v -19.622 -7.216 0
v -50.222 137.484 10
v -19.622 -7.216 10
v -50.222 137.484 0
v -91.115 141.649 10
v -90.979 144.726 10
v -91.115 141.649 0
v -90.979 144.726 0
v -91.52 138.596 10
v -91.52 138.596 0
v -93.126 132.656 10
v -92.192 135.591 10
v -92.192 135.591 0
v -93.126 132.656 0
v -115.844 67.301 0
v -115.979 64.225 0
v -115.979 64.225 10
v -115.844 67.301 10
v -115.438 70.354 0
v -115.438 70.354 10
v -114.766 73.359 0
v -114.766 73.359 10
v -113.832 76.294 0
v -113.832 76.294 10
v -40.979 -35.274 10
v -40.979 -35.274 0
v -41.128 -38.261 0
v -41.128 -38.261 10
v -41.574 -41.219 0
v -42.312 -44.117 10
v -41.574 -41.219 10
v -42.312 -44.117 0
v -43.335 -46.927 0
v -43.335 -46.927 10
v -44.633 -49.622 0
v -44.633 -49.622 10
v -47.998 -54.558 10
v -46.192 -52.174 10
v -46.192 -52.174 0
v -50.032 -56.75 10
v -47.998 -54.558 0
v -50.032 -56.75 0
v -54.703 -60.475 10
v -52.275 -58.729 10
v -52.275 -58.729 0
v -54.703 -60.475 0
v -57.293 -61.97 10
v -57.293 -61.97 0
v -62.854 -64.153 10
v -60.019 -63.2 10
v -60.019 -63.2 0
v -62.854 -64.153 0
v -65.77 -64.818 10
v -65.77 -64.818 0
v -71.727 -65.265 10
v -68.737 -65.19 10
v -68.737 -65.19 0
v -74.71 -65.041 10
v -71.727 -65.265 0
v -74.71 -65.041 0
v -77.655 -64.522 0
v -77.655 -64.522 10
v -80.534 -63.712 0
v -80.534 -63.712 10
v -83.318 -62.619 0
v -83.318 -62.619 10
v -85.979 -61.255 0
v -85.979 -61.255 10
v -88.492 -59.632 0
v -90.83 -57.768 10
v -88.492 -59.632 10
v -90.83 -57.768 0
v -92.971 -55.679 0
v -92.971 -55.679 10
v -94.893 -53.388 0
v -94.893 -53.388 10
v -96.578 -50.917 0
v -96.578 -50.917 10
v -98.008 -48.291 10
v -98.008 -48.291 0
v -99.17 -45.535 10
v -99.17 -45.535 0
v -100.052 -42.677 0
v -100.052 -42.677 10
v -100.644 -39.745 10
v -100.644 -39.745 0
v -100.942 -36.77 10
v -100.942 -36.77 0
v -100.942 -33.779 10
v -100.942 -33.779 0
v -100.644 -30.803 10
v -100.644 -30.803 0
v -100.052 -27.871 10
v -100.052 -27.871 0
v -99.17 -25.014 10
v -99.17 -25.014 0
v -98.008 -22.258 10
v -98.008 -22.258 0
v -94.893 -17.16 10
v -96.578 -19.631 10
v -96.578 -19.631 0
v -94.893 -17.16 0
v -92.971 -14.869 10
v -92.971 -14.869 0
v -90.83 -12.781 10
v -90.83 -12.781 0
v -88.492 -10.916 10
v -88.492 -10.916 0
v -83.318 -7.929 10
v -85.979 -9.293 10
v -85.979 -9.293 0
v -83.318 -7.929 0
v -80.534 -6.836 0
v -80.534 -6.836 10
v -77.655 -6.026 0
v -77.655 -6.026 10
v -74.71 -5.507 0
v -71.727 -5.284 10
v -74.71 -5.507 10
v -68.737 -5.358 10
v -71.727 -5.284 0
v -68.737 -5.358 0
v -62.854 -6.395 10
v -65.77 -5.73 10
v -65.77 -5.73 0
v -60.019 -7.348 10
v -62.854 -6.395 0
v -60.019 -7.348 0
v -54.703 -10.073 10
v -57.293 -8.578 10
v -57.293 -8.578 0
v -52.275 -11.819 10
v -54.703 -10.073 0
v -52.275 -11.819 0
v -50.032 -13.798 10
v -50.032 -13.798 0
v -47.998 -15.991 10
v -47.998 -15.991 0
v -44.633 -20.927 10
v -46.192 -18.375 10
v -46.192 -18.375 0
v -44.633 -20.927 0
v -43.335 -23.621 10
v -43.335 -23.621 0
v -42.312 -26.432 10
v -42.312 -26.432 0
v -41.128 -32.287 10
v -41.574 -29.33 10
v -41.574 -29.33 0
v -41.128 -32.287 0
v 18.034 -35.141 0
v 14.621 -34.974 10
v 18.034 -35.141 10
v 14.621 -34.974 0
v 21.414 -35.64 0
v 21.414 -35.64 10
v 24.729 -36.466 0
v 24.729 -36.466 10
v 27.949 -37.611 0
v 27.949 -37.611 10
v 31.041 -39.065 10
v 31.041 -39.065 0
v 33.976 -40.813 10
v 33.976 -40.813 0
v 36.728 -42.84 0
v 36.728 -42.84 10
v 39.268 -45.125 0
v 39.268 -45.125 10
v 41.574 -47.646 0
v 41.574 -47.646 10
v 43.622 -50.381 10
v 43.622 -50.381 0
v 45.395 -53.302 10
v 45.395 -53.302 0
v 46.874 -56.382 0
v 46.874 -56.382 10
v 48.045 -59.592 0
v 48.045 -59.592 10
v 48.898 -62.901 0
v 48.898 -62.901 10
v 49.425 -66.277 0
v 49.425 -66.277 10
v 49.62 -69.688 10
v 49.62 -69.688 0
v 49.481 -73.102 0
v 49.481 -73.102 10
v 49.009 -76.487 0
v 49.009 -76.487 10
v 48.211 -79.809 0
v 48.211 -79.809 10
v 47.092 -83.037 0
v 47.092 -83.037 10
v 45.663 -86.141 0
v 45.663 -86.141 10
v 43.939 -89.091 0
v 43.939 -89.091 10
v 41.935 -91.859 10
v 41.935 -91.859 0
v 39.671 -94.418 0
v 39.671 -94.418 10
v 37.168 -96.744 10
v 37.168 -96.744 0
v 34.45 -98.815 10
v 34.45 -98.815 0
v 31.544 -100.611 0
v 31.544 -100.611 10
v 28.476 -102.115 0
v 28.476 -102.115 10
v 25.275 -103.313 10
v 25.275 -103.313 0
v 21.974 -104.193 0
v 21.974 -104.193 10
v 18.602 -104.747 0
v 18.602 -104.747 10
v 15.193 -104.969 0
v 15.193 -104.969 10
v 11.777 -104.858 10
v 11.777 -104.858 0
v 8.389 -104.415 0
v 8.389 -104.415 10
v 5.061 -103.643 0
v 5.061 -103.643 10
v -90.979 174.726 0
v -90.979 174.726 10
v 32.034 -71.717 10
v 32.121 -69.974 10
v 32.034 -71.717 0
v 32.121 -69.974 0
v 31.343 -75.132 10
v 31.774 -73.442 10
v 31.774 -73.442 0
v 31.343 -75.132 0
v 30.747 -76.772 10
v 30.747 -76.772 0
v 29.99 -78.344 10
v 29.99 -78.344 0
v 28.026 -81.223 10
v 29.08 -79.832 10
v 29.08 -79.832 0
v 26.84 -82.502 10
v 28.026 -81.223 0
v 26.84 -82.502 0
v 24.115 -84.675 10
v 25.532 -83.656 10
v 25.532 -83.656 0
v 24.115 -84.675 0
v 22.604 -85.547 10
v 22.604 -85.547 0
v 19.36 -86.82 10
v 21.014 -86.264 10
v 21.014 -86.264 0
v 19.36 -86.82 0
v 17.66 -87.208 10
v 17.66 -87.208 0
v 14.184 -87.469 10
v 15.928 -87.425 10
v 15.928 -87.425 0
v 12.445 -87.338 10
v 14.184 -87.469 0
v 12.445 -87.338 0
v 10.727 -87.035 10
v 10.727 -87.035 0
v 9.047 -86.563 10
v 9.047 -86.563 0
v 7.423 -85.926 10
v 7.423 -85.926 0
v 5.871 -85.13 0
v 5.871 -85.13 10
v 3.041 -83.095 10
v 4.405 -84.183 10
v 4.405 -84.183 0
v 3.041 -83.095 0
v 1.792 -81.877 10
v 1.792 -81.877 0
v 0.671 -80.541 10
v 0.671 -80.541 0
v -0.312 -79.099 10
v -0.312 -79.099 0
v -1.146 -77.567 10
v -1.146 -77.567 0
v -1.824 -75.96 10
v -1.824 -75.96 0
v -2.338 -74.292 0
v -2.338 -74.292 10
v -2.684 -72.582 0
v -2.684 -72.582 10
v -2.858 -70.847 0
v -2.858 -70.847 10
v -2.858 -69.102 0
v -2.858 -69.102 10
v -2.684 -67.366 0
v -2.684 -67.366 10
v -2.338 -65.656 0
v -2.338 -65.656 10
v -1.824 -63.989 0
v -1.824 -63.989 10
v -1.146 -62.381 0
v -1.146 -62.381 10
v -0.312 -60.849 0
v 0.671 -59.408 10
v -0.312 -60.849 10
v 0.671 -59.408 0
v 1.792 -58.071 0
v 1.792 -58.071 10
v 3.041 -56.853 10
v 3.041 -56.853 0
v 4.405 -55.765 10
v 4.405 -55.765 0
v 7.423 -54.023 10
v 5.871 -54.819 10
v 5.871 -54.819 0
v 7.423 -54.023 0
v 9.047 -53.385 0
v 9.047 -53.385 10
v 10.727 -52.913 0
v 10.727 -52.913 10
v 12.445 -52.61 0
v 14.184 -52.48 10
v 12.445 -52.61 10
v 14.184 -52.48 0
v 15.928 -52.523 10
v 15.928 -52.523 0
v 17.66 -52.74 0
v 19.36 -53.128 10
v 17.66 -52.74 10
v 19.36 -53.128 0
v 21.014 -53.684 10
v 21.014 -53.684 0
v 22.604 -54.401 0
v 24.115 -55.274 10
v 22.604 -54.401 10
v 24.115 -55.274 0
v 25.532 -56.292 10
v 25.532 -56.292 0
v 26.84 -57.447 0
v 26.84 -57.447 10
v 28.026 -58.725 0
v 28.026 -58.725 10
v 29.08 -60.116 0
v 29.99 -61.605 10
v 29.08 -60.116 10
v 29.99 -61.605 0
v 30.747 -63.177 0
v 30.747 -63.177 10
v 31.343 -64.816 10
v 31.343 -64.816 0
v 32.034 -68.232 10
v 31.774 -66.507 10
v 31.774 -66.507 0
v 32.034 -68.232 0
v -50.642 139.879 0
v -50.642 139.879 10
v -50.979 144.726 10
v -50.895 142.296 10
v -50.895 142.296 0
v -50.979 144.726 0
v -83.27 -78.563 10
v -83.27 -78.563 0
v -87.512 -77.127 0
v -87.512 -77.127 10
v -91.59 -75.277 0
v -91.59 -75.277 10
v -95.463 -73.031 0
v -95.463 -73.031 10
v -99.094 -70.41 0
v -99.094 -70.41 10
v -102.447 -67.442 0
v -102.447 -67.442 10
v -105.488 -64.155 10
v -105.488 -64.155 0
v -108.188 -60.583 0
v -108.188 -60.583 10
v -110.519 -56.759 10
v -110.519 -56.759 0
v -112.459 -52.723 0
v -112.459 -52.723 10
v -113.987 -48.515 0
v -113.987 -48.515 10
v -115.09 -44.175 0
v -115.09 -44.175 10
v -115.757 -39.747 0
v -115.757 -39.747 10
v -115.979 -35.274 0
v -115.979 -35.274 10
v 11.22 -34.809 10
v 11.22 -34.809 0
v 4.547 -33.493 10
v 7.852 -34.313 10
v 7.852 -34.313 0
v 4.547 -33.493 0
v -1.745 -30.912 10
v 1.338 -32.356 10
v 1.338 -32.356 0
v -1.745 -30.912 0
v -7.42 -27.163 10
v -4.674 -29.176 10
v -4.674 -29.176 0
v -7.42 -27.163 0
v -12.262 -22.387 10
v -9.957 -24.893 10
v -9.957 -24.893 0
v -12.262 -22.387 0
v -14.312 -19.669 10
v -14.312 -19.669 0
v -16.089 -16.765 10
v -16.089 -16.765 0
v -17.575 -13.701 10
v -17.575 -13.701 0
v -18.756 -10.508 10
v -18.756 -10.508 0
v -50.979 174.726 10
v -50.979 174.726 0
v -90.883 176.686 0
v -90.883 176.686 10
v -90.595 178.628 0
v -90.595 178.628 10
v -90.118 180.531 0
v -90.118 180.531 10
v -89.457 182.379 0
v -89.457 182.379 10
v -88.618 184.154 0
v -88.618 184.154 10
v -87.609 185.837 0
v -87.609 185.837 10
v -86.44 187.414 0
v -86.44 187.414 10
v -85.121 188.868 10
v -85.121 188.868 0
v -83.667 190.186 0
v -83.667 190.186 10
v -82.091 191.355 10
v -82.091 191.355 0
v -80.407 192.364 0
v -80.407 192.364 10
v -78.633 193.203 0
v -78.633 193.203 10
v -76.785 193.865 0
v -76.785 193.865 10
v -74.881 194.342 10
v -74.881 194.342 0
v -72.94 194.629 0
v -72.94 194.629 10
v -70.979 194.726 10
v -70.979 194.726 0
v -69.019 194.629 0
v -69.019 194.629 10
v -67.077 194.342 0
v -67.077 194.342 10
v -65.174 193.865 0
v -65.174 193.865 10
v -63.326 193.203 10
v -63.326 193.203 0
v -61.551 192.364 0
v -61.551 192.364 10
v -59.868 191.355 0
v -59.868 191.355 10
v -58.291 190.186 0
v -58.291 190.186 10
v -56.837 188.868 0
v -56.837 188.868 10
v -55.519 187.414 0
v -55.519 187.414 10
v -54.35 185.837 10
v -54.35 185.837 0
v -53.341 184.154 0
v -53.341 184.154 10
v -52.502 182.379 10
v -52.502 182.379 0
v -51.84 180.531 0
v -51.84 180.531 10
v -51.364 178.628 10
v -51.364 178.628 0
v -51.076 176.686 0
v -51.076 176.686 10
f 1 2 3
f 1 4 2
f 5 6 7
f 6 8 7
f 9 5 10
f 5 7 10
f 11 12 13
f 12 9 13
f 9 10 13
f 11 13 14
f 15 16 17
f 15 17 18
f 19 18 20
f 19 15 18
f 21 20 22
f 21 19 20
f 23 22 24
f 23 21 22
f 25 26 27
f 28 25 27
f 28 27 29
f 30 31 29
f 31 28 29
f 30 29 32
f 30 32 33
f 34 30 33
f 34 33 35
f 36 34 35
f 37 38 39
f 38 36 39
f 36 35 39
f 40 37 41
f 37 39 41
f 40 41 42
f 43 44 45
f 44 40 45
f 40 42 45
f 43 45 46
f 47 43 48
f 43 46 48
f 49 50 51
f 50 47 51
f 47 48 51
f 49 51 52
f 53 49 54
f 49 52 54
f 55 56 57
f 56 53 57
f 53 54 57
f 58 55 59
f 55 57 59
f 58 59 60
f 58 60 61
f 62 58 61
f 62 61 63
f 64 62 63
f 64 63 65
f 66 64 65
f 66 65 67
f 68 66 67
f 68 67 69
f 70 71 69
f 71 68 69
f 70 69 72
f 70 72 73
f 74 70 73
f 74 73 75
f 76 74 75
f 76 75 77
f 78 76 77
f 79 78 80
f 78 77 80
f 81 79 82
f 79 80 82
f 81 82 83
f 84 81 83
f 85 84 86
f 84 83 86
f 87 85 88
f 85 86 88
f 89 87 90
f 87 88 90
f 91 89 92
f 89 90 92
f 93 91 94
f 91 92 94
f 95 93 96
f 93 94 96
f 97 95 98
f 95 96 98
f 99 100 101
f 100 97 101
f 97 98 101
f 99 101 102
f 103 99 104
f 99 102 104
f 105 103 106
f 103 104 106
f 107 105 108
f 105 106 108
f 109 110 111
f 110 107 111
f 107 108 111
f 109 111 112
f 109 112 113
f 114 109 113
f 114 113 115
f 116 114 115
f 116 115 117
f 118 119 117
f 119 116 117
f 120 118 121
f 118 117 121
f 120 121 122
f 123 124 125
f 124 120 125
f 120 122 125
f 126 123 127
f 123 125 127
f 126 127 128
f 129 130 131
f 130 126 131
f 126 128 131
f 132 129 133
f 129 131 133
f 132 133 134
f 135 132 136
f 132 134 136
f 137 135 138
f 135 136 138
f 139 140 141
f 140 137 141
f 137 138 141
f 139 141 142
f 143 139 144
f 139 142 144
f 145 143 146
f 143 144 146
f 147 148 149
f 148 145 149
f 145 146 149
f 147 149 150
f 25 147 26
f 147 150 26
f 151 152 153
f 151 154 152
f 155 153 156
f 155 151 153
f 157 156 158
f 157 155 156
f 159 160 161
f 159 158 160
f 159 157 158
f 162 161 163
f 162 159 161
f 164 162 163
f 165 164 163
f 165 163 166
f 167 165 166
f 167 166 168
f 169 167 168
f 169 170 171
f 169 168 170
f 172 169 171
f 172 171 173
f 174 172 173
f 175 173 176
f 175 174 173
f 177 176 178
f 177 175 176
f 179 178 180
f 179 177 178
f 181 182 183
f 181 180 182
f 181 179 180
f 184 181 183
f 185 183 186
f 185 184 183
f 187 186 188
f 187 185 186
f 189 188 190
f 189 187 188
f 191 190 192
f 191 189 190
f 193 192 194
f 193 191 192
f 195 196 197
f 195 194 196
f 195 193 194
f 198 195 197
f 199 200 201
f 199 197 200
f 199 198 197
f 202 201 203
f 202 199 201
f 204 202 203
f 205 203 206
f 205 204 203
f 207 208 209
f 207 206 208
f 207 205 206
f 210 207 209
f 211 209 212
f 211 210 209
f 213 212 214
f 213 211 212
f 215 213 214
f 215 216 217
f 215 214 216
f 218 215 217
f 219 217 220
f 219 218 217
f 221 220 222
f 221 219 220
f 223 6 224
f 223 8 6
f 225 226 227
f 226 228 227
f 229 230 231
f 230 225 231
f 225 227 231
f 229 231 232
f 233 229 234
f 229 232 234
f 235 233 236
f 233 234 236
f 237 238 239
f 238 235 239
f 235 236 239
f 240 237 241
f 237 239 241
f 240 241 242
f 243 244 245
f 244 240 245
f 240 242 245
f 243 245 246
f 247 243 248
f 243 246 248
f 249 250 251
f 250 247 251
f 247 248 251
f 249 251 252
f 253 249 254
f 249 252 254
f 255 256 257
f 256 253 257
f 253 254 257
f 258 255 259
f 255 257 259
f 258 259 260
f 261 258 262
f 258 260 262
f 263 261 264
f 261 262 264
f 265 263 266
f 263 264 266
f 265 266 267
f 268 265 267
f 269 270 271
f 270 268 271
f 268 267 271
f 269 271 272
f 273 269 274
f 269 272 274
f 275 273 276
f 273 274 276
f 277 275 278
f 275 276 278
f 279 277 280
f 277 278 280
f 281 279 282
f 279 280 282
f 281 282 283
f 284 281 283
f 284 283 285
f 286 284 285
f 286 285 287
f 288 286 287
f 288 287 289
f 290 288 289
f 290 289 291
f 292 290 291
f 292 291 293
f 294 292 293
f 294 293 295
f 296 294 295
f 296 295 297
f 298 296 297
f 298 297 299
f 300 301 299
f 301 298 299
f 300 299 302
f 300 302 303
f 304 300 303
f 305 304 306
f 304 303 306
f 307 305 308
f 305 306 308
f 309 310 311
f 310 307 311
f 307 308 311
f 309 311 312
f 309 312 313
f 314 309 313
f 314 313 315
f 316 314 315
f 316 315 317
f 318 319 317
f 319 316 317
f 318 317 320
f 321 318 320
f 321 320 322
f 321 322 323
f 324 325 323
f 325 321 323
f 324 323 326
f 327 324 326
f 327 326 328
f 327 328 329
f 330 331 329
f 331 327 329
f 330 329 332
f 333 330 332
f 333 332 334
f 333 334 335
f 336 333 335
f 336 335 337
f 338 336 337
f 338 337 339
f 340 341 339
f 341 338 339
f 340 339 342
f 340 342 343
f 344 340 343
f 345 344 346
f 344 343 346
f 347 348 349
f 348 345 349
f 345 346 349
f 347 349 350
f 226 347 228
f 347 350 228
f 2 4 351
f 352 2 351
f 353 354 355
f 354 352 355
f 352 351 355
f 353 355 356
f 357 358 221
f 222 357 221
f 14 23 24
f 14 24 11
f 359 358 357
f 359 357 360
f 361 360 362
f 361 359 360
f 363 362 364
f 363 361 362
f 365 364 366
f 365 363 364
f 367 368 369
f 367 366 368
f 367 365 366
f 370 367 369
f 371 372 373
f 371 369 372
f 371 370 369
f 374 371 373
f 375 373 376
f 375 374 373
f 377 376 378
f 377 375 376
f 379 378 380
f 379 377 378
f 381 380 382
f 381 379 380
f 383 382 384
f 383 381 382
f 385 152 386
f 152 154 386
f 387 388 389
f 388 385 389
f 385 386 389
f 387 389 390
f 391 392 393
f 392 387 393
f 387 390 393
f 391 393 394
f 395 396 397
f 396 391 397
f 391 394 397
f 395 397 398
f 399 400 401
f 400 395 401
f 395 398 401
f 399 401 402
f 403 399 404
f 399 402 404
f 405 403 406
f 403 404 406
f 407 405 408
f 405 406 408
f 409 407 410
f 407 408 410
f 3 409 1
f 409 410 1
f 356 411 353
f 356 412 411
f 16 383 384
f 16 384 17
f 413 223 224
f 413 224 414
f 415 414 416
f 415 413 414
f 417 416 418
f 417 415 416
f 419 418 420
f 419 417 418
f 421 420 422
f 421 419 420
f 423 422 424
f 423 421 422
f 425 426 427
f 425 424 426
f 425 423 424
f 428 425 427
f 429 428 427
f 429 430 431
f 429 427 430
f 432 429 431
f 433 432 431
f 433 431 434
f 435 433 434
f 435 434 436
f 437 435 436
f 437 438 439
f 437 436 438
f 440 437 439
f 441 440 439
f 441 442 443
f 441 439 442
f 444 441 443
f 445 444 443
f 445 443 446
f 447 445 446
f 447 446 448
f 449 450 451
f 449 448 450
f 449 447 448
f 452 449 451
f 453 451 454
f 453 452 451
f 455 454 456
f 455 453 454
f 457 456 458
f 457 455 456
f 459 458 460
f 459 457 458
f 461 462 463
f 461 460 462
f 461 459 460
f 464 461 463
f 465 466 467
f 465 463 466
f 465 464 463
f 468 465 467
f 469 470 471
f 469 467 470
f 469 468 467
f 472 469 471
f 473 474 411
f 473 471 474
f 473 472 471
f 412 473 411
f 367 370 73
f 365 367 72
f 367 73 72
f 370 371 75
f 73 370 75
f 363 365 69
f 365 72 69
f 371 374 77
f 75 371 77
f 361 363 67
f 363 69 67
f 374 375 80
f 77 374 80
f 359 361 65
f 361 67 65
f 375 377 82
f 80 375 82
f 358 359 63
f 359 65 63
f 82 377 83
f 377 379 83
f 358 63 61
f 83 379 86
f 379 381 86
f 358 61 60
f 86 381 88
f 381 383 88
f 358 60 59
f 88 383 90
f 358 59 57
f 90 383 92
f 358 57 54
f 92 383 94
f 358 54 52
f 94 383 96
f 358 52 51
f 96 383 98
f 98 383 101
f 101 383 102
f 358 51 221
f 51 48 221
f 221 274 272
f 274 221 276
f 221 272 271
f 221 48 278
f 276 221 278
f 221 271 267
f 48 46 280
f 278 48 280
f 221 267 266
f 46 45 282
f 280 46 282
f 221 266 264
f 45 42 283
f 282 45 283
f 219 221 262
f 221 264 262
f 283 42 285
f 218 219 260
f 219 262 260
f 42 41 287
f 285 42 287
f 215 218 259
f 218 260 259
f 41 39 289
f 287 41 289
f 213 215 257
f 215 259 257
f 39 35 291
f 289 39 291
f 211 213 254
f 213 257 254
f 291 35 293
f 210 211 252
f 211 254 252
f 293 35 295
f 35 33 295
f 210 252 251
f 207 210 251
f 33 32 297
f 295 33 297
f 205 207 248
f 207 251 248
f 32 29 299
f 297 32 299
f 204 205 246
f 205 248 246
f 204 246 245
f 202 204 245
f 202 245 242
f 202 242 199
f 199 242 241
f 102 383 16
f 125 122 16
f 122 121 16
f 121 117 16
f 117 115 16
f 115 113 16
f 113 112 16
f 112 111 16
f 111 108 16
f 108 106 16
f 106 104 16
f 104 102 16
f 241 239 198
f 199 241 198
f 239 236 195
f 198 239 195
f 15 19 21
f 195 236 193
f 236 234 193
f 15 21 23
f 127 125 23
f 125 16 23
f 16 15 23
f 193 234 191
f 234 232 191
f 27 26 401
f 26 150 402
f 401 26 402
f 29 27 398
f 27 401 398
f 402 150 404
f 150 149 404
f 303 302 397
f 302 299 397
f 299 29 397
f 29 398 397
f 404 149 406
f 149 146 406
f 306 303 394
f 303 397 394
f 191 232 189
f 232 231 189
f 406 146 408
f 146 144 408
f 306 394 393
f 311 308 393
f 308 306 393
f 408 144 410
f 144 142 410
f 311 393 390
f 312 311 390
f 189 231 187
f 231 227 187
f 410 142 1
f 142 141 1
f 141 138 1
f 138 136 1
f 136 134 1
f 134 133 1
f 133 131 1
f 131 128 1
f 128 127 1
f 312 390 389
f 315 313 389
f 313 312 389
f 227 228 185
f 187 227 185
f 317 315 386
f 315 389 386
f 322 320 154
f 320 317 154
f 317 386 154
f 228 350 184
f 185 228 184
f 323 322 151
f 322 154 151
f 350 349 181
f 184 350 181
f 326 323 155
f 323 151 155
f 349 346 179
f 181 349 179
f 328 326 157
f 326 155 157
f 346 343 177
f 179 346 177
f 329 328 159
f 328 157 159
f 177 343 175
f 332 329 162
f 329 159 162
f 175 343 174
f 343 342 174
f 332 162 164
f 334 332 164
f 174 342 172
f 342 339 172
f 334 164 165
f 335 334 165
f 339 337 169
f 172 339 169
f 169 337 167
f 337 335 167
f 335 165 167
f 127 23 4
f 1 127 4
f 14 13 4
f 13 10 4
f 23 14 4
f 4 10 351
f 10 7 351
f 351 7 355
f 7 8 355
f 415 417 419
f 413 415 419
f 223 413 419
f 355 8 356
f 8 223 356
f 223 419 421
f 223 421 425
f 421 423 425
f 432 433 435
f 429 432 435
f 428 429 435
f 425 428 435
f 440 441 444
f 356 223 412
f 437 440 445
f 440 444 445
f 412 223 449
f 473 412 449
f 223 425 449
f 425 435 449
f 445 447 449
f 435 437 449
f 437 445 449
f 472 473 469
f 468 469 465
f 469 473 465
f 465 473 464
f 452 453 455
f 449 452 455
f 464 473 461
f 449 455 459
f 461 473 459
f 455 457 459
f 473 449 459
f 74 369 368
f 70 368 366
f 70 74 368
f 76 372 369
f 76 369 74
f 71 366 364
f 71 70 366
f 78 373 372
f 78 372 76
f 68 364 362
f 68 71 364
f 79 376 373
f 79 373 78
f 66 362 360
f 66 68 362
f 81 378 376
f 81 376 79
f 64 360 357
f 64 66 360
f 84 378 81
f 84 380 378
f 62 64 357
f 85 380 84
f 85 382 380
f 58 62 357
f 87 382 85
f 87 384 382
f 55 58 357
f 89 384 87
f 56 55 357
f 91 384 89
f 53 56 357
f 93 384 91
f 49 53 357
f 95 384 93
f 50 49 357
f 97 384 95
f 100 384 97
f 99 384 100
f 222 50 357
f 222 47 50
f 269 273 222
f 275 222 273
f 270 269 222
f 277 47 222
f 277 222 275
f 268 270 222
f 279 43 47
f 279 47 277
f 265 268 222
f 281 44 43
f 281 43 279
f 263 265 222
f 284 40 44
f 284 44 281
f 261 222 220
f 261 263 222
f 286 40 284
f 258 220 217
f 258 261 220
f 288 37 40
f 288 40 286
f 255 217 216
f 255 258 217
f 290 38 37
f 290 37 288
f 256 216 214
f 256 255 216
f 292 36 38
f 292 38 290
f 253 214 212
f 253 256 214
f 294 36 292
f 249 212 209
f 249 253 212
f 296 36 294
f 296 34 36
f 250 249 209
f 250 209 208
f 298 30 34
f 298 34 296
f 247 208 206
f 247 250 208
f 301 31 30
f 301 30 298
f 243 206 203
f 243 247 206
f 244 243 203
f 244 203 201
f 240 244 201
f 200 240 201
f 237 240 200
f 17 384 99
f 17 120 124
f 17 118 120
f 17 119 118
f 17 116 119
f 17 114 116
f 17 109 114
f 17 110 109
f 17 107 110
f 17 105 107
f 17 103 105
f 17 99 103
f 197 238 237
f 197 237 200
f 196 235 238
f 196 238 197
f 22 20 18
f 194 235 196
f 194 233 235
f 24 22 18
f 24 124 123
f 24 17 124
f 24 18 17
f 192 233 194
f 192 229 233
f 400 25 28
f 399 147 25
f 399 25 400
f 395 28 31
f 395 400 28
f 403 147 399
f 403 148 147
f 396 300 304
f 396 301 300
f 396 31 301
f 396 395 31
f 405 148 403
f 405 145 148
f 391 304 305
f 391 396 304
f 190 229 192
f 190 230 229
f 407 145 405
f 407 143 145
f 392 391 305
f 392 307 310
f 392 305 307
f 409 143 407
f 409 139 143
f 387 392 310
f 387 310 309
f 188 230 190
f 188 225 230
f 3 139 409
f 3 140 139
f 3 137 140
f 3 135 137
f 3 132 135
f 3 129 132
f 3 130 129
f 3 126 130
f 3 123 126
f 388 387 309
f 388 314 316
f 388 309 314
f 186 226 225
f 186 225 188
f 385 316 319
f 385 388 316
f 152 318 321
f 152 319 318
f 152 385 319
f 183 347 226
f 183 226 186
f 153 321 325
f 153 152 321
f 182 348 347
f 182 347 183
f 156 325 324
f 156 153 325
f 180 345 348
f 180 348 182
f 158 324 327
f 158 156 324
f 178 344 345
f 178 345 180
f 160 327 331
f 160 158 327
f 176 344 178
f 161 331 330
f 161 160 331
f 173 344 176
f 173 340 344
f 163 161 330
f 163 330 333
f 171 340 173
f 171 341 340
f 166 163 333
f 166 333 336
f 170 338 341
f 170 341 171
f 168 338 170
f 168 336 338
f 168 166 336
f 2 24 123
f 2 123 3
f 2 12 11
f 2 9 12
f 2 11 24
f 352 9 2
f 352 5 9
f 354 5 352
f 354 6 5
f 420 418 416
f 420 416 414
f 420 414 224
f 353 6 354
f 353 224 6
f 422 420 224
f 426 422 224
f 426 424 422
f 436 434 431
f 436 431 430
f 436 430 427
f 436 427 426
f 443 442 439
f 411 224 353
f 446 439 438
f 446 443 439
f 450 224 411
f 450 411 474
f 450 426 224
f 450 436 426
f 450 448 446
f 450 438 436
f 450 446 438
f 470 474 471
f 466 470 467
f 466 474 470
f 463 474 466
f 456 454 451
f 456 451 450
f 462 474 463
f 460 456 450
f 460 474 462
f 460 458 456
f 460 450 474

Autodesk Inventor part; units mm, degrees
ref_plane "YZ Plane" through (0, 0, 0) normal (1, 0, 0) x (0, 1, 0)
ref_plane "XZ Plane" through (0, 0, 0) normal (0, 1, 0) x (-1, 0, 0)
ref_plane "XY Plane" through (0, 0, 0) normal (0, 0, 1) x (1, 0, 0)
sketch "Sketch1" plane through (0, 0, 0) normal (0, 0, 1) x (1, 0, 0)
  line L0 (-115.9793, -35.2742) -> (-115.9793, 64.2246)
  arc A0 (-113.8324, 76.2941) -> (-115.9793, 64.2246) centre (-80.9793, 64.2246) ccw
  line L1 (-113.8324, 76.2941) -> (-93.1262, 132.6563)
  arc A1 (-93.1262, 132.6563) -> (-90.9793, 144.7258) centre (-125.9793, 144.7258) ccw
  line L2 (-90.9793, 144.7258) -> (-90.9793, 174.7258)
  arc A2 (-50.9793, 174.7258) -> (-90.9793, 174.7258) centre (-70.9793, 174.7258) ccw
  line L3 (-50.9793, 174.7258) -> (-50.9793, 144.7258)
  arc A3 (-50.9793, 144.7258) -> (-50.222, 137.4844) centre (-15.9793, 144.7258) ccw
  line L4 (-50.222, 137.4844) -> (-19.622, -7.2156)
  arc A4 (-115.9793, -35.2742) -> (-83.2704, -78.5631) centre (-70.9793, -35.2742) ccw
  line L5 (-83.2704, -78.5631) -> (5.0609, -103.6433)
  arc A5 (5.0609, -103.6433) -> (14.6207, -34.9742) centre (14.6207, -69.9742) ccw
  arc A6 (-19.622, -7.2156) -> (14.6207, -34.9742) centre (14.6207, 0.0258) ccw
  circle A7 centre (-70.9793, -35.2742) radius 30
  circle A8 centre (14.6207, -69.9742) radius 17.5
  dimension "d0" = 20
  dimension "d1" = 210
  dimension "d4" = 85.6
  dimension "d5" = 34.7
  dimension "d7" = 35
  dimension "d8" = 35
  dimension "d9" = 35
  dimension "d10" = 35
  dimension "d11" = 45
  dimension "d12" = 35
  dimension "d13" = 100
  dimension "d15" = 35
  dimension "d16" = 60
  dimension "d17" = 180
  dimension "d18" = 180
extrude "Extrusion1" add sketch "Sketch1" along normal blind 10
equation "\"d8\" = d7"
equation "\"d9\" = d7"
equation "\"d10\" = d9"
properties part number "3136 1133 81" material "Steel, Mild"
